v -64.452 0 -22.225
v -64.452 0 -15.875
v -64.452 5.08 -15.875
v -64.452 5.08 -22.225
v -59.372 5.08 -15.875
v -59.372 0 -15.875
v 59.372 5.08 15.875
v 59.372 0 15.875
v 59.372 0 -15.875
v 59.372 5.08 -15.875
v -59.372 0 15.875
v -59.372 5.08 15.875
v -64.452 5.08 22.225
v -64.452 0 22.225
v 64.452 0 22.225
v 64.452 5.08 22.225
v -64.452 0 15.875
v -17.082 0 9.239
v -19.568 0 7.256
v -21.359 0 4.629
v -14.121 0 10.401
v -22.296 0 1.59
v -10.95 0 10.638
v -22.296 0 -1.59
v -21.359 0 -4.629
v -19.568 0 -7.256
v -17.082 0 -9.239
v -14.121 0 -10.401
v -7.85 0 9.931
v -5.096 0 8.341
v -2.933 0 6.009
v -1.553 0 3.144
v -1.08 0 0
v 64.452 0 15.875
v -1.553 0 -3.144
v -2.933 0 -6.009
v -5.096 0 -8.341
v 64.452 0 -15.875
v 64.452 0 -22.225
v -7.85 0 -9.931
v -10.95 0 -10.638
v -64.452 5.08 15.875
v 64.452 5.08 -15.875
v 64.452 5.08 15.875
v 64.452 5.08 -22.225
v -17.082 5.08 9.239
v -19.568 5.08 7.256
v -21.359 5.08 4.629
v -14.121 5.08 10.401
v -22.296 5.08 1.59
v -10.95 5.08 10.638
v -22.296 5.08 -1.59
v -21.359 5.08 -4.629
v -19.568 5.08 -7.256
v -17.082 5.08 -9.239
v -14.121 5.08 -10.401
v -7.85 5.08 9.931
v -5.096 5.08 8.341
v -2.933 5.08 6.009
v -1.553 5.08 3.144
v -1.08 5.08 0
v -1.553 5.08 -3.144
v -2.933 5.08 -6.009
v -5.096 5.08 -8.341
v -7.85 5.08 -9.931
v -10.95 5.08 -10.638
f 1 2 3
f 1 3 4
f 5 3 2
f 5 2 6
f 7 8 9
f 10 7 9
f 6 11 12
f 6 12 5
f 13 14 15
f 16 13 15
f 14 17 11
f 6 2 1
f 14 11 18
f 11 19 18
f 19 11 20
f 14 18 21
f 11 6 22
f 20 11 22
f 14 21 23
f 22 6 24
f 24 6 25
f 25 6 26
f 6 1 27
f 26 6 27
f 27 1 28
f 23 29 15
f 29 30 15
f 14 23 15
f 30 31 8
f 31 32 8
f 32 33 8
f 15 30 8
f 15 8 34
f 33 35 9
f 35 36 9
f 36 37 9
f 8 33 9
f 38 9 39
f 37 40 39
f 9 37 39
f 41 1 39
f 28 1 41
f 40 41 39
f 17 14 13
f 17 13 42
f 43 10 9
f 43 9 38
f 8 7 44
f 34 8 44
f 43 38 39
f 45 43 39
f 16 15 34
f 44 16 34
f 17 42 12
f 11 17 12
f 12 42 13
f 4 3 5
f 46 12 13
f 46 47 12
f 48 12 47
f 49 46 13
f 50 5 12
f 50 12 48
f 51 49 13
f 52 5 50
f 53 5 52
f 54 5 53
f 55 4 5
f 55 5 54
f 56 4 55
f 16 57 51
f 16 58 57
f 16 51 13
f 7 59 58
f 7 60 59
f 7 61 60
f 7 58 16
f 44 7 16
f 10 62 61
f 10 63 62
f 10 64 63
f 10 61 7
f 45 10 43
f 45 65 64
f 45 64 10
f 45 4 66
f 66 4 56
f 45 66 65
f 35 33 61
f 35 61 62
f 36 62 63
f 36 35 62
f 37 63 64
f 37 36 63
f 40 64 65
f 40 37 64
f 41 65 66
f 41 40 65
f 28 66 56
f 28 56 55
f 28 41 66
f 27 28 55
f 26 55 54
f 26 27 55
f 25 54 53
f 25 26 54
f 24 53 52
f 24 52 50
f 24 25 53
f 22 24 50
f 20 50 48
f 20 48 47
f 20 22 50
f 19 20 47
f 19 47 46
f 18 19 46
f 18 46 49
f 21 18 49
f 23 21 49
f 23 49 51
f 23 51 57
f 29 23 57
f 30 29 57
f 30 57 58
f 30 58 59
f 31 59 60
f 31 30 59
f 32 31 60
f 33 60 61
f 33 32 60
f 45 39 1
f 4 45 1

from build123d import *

# Parameters (mm, degrees)
SKETCH1_W           = 5.08
SKETCH1_H           = 6.35
SKETCH1_W_2         = 118.745
SKETCH1_H_2         = 44.45
SKETCH1_R           = 10.668
BOSS_EXTRUDE1_DEPTH = 5.08


with BuildPart() as part:
    # Sketch1 → Boss-Extrude1 (new body)
    with BuildSketch(Plane(origin=(0, 0, 0), x_dir=(1, 0, 0), z_dir=(0, 1, 0))):
        with Locations((-61.9125, -19.05)):
            Rectangle(SKETCH1_W, SKETCH1_H)
        with Locations((-61.9125, 19.05)):
            Rectangle(SKETCH1_W, SKETCH1_H)
        Rectangle(SKETCH1_W_2, SKETCH1_H_2)
        with Locations((-11.7475, 0)):
            Circle(SKETCH1_R, mode=Mode.SUBTRACT)
        with Locations((61.9125, 19.05)):
            Rectangle(SKETCH1_W, SKETCH1_H)
        with Locations((61.9125, -19.05)):
            Rectangle(SKETCH1_W, SKETCH1_H)
    extrude(amount=BOSS_EXTRUDE1_DEPTH)


solid = part.part
